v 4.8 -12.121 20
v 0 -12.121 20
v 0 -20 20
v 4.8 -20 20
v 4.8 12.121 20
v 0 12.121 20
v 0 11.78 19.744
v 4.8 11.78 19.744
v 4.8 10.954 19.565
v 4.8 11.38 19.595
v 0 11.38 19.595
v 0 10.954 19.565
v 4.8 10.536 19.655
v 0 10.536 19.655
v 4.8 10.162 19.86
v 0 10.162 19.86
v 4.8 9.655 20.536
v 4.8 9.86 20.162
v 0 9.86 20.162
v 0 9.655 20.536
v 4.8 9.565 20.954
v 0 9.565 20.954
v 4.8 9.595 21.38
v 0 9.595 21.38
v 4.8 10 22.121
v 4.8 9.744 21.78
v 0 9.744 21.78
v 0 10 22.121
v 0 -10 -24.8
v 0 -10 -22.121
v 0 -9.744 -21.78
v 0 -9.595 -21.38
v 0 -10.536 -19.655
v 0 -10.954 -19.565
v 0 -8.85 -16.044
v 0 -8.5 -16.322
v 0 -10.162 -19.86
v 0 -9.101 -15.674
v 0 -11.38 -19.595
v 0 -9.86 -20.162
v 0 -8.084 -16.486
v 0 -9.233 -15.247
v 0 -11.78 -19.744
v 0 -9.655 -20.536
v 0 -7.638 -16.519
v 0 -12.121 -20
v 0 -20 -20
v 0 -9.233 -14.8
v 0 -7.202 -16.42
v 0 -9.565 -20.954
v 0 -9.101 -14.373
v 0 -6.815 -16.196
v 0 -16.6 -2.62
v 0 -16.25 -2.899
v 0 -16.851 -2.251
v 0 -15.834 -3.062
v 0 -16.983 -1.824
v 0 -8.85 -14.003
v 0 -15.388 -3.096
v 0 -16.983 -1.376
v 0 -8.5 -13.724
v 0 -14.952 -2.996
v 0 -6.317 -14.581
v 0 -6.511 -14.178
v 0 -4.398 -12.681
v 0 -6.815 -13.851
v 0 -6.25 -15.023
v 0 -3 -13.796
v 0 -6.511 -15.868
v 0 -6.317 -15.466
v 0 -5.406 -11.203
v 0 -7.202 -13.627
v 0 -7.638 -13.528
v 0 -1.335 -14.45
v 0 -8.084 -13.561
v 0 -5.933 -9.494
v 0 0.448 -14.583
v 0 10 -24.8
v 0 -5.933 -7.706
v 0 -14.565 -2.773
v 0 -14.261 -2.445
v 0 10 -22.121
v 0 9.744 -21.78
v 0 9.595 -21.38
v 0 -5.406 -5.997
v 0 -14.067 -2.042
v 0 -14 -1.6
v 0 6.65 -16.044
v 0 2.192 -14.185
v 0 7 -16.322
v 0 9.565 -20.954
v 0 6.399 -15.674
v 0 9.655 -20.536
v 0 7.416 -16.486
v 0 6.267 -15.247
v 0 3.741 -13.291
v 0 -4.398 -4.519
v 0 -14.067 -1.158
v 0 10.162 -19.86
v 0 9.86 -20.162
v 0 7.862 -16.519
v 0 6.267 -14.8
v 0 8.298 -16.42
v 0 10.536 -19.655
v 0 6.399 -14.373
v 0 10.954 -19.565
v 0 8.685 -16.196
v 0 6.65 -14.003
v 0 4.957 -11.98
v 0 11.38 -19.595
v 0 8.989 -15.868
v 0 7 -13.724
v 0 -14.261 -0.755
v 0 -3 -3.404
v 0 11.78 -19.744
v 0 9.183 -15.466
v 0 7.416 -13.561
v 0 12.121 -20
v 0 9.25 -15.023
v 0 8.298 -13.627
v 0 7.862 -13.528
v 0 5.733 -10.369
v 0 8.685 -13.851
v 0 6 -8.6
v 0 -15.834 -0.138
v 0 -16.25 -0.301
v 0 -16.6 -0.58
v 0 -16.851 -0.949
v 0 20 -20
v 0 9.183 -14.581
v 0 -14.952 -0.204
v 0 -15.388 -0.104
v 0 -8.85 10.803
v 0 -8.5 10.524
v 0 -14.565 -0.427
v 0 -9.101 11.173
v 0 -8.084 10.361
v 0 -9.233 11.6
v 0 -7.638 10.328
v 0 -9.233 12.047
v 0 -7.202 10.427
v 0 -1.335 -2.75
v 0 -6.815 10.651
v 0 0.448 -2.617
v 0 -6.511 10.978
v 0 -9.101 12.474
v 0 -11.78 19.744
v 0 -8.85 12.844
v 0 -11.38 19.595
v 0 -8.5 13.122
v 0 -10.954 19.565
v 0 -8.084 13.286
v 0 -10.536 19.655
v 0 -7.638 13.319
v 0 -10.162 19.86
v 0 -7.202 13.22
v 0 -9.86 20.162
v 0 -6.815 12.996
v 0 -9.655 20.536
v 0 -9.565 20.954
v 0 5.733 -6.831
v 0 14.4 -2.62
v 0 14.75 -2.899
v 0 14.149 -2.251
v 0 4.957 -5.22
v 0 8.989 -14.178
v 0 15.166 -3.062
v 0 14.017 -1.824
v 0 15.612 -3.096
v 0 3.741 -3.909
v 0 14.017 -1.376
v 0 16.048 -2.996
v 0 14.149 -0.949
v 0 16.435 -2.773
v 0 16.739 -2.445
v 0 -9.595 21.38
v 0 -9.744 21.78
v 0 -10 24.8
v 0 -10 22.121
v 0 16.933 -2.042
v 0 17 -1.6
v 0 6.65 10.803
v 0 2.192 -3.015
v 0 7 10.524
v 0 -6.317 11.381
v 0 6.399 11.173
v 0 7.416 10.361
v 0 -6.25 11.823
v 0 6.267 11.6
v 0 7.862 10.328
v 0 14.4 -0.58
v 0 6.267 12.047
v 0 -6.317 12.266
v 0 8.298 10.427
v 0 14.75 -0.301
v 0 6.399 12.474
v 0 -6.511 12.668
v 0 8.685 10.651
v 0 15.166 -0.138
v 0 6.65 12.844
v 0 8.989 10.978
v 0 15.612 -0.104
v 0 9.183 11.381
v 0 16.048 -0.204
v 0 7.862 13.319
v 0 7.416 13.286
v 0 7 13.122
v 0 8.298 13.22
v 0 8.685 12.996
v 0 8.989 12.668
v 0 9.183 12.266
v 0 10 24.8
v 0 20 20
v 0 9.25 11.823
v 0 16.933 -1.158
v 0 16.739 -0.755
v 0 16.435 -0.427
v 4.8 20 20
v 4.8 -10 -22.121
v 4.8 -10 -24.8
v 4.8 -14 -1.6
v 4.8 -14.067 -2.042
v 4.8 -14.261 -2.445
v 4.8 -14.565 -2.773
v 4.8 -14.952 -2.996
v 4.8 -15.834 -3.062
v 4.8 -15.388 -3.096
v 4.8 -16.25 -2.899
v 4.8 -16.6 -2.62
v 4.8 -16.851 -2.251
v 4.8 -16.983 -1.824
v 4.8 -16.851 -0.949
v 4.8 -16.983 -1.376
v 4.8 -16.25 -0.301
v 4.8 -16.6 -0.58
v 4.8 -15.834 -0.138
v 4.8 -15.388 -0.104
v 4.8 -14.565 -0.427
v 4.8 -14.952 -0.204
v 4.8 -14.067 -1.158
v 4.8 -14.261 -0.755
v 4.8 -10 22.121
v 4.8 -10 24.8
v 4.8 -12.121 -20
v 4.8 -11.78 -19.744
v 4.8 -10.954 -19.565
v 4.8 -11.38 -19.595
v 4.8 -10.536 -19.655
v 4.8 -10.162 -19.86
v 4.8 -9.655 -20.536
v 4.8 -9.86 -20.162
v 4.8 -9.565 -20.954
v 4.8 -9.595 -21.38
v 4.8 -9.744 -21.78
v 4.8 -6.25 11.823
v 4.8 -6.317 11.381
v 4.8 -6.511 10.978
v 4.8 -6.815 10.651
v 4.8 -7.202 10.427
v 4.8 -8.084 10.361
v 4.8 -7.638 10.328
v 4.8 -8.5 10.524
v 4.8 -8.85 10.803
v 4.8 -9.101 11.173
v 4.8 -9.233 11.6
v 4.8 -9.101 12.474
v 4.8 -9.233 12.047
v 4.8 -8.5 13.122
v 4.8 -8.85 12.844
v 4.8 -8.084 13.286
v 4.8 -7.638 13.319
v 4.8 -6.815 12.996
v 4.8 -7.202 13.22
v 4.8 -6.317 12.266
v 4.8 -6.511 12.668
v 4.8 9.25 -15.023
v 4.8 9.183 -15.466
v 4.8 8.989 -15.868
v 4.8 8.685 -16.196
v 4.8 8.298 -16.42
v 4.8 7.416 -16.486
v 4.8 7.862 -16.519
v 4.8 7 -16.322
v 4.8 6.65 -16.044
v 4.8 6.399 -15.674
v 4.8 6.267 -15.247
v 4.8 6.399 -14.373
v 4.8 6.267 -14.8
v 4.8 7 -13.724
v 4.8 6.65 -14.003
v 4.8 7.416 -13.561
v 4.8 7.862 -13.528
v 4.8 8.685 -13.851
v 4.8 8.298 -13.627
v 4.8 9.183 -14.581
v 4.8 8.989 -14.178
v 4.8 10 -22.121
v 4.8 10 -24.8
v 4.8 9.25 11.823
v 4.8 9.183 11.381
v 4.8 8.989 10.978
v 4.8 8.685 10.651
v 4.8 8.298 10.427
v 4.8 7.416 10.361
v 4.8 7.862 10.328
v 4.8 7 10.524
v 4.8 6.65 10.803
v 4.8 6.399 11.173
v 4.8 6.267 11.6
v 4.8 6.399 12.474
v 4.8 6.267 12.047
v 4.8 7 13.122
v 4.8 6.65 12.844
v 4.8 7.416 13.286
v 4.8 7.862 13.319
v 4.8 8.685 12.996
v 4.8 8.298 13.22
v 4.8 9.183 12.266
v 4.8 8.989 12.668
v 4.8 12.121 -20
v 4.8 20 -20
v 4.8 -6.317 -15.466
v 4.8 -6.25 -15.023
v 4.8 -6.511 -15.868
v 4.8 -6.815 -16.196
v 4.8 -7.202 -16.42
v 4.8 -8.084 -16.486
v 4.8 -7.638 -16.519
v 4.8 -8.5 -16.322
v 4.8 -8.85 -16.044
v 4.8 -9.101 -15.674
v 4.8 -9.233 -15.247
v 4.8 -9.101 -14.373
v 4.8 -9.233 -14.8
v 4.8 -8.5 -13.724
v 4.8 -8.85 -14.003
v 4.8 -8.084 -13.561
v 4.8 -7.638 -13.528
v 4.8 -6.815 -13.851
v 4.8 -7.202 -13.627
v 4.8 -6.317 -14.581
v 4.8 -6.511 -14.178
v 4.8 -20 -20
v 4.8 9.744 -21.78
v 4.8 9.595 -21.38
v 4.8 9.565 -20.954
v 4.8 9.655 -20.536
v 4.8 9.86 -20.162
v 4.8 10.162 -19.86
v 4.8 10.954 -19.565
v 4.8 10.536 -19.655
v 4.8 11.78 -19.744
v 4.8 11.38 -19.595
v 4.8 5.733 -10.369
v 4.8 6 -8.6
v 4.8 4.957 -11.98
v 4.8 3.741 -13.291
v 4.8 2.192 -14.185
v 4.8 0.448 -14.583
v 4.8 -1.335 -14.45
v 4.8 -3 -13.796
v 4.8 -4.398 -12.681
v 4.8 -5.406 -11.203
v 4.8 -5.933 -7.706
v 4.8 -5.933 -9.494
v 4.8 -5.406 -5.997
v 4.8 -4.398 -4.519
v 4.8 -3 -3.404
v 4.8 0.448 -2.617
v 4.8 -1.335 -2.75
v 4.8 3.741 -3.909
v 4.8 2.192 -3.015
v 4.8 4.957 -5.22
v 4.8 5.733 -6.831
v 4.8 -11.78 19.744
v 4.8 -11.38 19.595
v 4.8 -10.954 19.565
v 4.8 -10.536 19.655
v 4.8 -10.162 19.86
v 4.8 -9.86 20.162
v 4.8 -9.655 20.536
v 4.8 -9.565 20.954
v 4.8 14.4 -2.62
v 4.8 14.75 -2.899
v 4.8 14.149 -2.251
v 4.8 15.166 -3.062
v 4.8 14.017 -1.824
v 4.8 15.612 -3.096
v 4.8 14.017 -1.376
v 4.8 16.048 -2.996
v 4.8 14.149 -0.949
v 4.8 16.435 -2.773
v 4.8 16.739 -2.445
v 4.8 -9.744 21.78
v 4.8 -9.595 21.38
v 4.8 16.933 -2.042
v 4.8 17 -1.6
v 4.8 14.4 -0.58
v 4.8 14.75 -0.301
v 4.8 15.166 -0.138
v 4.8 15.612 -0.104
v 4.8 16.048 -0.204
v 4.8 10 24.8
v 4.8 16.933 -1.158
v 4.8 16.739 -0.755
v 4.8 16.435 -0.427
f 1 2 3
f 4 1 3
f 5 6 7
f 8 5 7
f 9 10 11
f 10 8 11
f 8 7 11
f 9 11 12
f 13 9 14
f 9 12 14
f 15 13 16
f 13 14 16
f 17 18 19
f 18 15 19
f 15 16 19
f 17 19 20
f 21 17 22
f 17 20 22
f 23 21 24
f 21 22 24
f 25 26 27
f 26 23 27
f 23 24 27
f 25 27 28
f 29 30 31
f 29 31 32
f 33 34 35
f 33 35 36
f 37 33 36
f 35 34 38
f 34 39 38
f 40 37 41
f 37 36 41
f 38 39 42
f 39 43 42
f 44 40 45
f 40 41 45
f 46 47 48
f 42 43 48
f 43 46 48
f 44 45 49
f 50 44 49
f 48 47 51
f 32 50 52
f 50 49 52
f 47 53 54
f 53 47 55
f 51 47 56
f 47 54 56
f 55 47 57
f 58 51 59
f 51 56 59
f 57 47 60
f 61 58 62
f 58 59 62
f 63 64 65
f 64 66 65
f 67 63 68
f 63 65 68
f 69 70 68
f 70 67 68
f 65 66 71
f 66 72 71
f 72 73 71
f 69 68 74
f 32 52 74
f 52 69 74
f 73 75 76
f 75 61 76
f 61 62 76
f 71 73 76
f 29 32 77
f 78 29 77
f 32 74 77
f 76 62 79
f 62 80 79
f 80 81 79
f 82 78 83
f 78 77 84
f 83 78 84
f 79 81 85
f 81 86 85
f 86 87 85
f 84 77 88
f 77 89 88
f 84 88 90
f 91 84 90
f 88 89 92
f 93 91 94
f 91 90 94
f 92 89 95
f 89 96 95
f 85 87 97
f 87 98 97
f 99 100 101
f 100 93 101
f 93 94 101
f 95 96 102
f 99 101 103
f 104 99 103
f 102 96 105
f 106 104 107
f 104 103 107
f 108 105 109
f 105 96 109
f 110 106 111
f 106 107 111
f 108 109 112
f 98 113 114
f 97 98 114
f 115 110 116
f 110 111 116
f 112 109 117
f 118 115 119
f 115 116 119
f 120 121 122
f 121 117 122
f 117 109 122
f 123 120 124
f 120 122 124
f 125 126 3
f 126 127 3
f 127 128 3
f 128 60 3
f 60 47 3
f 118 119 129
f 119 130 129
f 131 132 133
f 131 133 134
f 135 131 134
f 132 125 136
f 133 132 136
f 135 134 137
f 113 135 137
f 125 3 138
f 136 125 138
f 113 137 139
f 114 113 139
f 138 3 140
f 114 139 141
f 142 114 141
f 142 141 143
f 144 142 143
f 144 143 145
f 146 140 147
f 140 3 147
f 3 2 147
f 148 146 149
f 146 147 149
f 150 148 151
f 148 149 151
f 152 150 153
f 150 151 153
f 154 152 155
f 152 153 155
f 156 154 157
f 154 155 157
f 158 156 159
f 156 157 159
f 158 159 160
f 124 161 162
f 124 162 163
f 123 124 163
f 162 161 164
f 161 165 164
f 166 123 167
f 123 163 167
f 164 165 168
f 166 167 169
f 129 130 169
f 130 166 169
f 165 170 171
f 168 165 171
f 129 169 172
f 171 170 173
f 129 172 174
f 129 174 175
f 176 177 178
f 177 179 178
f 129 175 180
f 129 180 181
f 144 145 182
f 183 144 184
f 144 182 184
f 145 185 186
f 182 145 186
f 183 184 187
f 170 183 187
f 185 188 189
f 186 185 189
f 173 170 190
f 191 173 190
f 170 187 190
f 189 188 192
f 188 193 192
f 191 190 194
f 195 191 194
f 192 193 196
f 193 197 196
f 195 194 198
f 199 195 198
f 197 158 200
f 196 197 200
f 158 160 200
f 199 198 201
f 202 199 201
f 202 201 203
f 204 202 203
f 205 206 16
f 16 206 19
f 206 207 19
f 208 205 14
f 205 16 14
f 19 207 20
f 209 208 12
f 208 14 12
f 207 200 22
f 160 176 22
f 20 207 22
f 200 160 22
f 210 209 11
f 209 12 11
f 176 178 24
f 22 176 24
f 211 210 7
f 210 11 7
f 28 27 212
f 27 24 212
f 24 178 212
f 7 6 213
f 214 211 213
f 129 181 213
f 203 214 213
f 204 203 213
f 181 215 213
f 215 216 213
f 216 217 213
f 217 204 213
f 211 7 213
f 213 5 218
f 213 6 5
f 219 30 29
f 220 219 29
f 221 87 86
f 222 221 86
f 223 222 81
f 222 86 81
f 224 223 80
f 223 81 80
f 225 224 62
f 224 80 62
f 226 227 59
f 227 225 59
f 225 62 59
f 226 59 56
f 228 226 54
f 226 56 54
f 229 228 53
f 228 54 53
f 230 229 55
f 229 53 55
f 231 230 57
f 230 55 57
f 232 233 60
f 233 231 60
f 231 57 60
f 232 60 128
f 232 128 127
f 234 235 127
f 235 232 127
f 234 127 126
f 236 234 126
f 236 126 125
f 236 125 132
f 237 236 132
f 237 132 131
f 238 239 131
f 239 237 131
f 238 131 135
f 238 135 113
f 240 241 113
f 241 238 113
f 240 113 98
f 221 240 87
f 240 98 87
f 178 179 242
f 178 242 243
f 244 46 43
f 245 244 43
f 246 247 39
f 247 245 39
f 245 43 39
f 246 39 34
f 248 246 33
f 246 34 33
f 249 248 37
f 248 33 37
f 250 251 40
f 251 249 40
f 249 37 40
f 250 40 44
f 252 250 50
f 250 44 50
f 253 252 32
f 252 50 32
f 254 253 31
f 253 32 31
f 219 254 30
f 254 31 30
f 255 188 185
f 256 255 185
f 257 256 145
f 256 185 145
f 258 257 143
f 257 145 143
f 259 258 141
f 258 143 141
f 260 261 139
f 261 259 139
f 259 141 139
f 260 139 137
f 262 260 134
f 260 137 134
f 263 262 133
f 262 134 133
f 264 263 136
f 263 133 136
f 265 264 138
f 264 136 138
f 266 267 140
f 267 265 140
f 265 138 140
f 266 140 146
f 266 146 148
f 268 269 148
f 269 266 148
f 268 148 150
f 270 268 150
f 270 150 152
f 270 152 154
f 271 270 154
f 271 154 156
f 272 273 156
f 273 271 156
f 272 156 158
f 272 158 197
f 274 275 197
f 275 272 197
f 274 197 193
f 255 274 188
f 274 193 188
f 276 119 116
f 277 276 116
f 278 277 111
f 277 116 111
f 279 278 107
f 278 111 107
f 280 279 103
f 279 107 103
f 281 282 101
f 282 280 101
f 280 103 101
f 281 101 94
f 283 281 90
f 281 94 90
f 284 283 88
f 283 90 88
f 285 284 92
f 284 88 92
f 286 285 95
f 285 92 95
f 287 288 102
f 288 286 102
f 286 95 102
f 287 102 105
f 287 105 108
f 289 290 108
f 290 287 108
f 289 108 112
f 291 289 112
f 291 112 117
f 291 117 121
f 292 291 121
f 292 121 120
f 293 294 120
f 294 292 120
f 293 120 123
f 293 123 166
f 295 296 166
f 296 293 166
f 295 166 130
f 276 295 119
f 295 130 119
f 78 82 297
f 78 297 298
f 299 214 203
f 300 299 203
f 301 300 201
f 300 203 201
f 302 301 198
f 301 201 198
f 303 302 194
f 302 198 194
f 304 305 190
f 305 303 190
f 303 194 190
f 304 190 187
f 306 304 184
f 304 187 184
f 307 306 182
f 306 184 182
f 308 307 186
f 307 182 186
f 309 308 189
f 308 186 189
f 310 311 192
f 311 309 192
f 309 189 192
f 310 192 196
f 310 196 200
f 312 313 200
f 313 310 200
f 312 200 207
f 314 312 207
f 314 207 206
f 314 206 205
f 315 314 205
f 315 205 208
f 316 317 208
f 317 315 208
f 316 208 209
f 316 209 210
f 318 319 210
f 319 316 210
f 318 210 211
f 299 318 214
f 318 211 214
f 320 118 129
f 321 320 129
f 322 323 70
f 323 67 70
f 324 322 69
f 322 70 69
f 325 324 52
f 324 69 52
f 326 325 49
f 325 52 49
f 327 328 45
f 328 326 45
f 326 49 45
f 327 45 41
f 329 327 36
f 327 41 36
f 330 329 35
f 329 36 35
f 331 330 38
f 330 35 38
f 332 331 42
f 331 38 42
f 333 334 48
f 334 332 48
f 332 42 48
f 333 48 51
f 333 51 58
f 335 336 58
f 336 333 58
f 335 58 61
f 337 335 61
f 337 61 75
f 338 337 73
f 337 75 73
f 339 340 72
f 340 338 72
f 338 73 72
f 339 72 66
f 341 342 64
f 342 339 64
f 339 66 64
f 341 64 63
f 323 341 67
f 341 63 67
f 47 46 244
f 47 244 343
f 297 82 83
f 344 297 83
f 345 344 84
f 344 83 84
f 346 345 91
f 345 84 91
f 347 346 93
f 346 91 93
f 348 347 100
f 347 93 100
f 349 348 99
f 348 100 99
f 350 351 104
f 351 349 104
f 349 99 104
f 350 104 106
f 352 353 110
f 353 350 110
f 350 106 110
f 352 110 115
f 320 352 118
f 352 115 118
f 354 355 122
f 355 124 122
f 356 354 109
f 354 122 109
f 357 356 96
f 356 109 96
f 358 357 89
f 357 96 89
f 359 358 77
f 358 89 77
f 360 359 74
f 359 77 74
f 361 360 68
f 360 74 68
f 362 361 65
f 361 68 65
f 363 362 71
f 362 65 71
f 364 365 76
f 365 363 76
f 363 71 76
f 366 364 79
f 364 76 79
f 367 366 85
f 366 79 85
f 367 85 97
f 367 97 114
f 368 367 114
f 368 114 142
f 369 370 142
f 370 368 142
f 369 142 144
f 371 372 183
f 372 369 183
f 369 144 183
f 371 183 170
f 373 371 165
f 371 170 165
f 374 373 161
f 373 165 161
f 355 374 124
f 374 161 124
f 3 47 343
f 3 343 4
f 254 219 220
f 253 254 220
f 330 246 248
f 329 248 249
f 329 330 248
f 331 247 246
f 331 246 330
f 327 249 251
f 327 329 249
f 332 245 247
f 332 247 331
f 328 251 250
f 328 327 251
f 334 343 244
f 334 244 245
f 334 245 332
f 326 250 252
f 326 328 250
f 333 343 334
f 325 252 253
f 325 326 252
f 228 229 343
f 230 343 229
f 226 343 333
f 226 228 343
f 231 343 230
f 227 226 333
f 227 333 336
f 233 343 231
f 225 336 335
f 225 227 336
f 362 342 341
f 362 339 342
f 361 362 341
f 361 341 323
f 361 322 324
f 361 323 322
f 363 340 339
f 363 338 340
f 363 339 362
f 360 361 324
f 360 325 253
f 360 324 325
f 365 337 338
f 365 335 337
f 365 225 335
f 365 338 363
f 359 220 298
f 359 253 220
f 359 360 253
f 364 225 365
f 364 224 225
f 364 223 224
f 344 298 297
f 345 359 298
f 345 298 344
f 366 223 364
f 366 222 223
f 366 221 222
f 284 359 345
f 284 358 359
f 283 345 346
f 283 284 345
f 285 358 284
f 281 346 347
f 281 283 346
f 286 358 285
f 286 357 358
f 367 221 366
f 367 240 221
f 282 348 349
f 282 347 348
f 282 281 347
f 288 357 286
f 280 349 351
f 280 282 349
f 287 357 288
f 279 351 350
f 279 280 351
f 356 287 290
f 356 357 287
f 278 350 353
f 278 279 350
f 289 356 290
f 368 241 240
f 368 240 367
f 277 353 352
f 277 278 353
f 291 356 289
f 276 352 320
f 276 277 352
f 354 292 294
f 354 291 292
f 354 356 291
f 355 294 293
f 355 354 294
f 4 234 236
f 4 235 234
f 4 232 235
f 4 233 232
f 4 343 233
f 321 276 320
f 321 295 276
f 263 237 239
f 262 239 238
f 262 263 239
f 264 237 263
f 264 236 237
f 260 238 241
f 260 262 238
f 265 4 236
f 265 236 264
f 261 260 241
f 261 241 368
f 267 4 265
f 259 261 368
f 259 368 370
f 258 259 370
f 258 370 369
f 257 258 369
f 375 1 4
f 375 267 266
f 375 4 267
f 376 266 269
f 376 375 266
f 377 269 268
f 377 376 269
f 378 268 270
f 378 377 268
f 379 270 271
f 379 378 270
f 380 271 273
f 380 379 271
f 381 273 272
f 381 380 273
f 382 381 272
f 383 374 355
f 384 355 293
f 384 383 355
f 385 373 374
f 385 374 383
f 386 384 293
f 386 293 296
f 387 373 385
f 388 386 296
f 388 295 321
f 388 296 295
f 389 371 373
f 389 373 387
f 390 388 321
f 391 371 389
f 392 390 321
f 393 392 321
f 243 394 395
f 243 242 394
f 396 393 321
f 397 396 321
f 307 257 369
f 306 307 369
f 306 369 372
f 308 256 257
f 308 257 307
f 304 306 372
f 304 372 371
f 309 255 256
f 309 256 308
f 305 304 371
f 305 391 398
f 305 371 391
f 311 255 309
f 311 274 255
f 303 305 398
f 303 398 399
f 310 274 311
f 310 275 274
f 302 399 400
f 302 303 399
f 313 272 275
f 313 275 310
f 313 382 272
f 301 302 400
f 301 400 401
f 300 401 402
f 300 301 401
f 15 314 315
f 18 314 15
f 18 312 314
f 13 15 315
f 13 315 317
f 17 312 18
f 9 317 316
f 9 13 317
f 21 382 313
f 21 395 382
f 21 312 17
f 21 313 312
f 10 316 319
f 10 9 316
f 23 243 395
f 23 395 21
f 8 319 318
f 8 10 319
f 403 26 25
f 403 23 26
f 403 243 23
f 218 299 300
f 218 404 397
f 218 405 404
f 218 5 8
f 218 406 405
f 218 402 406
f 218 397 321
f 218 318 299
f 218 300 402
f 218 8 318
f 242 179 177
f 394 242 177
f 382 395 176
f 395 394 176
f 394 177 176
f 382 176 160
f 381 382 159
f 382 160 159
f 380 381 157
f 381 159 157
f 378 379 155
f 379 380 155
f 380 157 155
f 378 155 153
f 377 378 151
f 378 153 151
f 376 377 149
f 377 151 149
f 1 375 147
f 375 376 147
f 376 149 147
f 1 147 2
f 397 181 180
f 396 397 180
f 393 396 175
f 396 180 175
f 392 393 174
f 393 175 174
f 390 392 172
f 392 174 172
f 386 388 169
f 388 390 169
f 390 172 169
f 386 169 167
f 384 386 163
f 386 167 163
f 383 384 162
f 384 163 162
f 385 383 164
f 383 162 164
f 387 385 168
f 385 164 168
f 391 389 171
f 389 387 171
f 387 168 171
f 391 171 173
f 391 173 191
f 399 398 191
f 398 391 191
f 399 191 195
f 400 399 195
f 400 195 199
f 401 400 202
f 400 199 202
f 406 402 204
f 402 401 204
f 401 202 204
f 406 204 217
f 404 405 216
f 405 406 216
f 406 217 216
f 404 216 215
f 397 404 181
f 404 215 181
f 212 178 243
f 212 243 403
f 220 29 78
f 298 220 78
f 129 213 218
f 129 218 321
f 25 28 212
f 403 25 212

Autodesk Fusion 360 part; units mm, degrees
sketch "Sketch1" plane through (0, 0, 0) normal (1, 0, 0) x (0, 1, 0)
  line L0 (-20, 20) -> (20, 20) construction
  line L1 (20, 20) -> (20, -20)
  line L2 (20, -20) -> (-20, -20) construction
  line L3 (-20, -20) -> (-20, 20)
  line L4 (0, 0) -> (0, 20) construction
  line L5 (0, 0) -> (20, 0) construction
  line L6 (0, 0) -> (0, -1.6) construction
  line L7 (0, 0) -> (0, -8.6) construction
  circle A0 centre (0, -8.6) radius 6
  circle A1 centre (0, -1.6) radius 18.4 construction
  circle A2 centre (0, -1.6) radius 15.5 construction
  line L8 (0, -1.6) -> (15.5, -1.6) construction
  circle A3 centre (15.5, -1.6) radius 1.5
  circle A4 centre (7.75, 11.8234) radius 1.5
  circle A5 centre (-7.75, 11.8234) radius 1.5
  circle A6 centre (-15.5, -1.6) radius 1.5
  circle A7 centre (-7.75, -15.0234) radius 1.5
  circle A8 centre (7.75, -15.0234) radius 1.5
  line L9 (-10, 20) -> (-10, 24.8) construction
  line L10 (-10, 24.8) -> (10, 24.8)
  line L11 (10, 24.8) -> (10, 20) construction
  line L12 (-10, -20) -> (-10, -24.8) construction
  line L13 (-10, -24.8) -> (10, -24.8)
  line L14 (10, -24.8) -> (10, -20) construction
  line L15 (-11.0607, -21.0607) -> (-10, -20) construction
  line L16 (11.0607, -21.0607) -> (10, -20) construction
  line L17 (-11.0607, 21.0607) -> (-10, 20) construction
  line L18 (11.0607, 21.0607) -> (10, 20) construction
  arc A9 (-12.1213, 20) -> (-10, 22.1213) centre (-11.0607, 21.0607) ccw
  arc A10 (-10, 22.1213) -> (-12.1213, 20) centre (-11.0607, 21.0607) ccw construction
  arc A11 (10, 22.1213) -> (12.1213, 20) centre (11.0607, 21.0607) ccw
  arc A12 (12.1213, 20) -> (10, 22.1213) centre (11.0607, 21.0607) ccw construction
  arc A13 (12.1213, -20) -> (10, -22.1213) centre (11.0607, -21.0607) ccw
  arc A14 (10, -22.1213) -> (12.1213, -20) centre (11.0607, -21.0607) ccw construction
  arc A15 (-10, -22.1213) -> (-12.1213, -20) centre (-11.0607, -21.0607) ccw
  arc A16 (-12.1213, -20) -> (-10, -22.1213) centre (-11.0607, -21.0607) ccw construction
  line L19 (-10, 22.1213) -> (-10, 24.8)
  line L20 (-12.1213, 20) -> (-20, 20)
  line L21 (10, 22.1213) -> (10, 24.8)
  line L22 (12.1213, 20) -> (20, 20)
  line L23 (10, -22.1213) -> (10, -24.8)
  line L24 (12.1213, -20) -> (20, -20)
  line L25 (-10, -22.1213) -> (-10, -24.8)
  line L26 (-12.1213, -20) -> (-20, -20)
  dimension "d61" = 40
  dimension "d62" = 40
  dimension "d63" = 1.6
  dimension "d65" = 12
  dimension "d66" = 36.8
  dimension "d67" = 31
  dimension "d68" = 3
  dimension "d70" = 360
  dimension "d71" = 4.8
  dimension "d72" = 20
  dimension "d73" = 10
  dimension "d74" = 4.8
  dimension "d75" = 20
  dimension "d76" = 10
  dimension "d77" = 3
  dimension "d78" = 1.5
  dimension "d79" = 45
  dimension "d80" = 3
  dimension "d81" = 1.5
  dimension "d83" = 45
  dimension "d84" = 3
  dimension "d85" = 3
  dimension "d86" = 1.5
  dimension "d87" = 45
  dimension "d88" = 1.5
  dimension "d89" = 45
  dimension "d90" = 7
extrude "Extrude1" add sketch "Sketch1" along normal blind 4.8
